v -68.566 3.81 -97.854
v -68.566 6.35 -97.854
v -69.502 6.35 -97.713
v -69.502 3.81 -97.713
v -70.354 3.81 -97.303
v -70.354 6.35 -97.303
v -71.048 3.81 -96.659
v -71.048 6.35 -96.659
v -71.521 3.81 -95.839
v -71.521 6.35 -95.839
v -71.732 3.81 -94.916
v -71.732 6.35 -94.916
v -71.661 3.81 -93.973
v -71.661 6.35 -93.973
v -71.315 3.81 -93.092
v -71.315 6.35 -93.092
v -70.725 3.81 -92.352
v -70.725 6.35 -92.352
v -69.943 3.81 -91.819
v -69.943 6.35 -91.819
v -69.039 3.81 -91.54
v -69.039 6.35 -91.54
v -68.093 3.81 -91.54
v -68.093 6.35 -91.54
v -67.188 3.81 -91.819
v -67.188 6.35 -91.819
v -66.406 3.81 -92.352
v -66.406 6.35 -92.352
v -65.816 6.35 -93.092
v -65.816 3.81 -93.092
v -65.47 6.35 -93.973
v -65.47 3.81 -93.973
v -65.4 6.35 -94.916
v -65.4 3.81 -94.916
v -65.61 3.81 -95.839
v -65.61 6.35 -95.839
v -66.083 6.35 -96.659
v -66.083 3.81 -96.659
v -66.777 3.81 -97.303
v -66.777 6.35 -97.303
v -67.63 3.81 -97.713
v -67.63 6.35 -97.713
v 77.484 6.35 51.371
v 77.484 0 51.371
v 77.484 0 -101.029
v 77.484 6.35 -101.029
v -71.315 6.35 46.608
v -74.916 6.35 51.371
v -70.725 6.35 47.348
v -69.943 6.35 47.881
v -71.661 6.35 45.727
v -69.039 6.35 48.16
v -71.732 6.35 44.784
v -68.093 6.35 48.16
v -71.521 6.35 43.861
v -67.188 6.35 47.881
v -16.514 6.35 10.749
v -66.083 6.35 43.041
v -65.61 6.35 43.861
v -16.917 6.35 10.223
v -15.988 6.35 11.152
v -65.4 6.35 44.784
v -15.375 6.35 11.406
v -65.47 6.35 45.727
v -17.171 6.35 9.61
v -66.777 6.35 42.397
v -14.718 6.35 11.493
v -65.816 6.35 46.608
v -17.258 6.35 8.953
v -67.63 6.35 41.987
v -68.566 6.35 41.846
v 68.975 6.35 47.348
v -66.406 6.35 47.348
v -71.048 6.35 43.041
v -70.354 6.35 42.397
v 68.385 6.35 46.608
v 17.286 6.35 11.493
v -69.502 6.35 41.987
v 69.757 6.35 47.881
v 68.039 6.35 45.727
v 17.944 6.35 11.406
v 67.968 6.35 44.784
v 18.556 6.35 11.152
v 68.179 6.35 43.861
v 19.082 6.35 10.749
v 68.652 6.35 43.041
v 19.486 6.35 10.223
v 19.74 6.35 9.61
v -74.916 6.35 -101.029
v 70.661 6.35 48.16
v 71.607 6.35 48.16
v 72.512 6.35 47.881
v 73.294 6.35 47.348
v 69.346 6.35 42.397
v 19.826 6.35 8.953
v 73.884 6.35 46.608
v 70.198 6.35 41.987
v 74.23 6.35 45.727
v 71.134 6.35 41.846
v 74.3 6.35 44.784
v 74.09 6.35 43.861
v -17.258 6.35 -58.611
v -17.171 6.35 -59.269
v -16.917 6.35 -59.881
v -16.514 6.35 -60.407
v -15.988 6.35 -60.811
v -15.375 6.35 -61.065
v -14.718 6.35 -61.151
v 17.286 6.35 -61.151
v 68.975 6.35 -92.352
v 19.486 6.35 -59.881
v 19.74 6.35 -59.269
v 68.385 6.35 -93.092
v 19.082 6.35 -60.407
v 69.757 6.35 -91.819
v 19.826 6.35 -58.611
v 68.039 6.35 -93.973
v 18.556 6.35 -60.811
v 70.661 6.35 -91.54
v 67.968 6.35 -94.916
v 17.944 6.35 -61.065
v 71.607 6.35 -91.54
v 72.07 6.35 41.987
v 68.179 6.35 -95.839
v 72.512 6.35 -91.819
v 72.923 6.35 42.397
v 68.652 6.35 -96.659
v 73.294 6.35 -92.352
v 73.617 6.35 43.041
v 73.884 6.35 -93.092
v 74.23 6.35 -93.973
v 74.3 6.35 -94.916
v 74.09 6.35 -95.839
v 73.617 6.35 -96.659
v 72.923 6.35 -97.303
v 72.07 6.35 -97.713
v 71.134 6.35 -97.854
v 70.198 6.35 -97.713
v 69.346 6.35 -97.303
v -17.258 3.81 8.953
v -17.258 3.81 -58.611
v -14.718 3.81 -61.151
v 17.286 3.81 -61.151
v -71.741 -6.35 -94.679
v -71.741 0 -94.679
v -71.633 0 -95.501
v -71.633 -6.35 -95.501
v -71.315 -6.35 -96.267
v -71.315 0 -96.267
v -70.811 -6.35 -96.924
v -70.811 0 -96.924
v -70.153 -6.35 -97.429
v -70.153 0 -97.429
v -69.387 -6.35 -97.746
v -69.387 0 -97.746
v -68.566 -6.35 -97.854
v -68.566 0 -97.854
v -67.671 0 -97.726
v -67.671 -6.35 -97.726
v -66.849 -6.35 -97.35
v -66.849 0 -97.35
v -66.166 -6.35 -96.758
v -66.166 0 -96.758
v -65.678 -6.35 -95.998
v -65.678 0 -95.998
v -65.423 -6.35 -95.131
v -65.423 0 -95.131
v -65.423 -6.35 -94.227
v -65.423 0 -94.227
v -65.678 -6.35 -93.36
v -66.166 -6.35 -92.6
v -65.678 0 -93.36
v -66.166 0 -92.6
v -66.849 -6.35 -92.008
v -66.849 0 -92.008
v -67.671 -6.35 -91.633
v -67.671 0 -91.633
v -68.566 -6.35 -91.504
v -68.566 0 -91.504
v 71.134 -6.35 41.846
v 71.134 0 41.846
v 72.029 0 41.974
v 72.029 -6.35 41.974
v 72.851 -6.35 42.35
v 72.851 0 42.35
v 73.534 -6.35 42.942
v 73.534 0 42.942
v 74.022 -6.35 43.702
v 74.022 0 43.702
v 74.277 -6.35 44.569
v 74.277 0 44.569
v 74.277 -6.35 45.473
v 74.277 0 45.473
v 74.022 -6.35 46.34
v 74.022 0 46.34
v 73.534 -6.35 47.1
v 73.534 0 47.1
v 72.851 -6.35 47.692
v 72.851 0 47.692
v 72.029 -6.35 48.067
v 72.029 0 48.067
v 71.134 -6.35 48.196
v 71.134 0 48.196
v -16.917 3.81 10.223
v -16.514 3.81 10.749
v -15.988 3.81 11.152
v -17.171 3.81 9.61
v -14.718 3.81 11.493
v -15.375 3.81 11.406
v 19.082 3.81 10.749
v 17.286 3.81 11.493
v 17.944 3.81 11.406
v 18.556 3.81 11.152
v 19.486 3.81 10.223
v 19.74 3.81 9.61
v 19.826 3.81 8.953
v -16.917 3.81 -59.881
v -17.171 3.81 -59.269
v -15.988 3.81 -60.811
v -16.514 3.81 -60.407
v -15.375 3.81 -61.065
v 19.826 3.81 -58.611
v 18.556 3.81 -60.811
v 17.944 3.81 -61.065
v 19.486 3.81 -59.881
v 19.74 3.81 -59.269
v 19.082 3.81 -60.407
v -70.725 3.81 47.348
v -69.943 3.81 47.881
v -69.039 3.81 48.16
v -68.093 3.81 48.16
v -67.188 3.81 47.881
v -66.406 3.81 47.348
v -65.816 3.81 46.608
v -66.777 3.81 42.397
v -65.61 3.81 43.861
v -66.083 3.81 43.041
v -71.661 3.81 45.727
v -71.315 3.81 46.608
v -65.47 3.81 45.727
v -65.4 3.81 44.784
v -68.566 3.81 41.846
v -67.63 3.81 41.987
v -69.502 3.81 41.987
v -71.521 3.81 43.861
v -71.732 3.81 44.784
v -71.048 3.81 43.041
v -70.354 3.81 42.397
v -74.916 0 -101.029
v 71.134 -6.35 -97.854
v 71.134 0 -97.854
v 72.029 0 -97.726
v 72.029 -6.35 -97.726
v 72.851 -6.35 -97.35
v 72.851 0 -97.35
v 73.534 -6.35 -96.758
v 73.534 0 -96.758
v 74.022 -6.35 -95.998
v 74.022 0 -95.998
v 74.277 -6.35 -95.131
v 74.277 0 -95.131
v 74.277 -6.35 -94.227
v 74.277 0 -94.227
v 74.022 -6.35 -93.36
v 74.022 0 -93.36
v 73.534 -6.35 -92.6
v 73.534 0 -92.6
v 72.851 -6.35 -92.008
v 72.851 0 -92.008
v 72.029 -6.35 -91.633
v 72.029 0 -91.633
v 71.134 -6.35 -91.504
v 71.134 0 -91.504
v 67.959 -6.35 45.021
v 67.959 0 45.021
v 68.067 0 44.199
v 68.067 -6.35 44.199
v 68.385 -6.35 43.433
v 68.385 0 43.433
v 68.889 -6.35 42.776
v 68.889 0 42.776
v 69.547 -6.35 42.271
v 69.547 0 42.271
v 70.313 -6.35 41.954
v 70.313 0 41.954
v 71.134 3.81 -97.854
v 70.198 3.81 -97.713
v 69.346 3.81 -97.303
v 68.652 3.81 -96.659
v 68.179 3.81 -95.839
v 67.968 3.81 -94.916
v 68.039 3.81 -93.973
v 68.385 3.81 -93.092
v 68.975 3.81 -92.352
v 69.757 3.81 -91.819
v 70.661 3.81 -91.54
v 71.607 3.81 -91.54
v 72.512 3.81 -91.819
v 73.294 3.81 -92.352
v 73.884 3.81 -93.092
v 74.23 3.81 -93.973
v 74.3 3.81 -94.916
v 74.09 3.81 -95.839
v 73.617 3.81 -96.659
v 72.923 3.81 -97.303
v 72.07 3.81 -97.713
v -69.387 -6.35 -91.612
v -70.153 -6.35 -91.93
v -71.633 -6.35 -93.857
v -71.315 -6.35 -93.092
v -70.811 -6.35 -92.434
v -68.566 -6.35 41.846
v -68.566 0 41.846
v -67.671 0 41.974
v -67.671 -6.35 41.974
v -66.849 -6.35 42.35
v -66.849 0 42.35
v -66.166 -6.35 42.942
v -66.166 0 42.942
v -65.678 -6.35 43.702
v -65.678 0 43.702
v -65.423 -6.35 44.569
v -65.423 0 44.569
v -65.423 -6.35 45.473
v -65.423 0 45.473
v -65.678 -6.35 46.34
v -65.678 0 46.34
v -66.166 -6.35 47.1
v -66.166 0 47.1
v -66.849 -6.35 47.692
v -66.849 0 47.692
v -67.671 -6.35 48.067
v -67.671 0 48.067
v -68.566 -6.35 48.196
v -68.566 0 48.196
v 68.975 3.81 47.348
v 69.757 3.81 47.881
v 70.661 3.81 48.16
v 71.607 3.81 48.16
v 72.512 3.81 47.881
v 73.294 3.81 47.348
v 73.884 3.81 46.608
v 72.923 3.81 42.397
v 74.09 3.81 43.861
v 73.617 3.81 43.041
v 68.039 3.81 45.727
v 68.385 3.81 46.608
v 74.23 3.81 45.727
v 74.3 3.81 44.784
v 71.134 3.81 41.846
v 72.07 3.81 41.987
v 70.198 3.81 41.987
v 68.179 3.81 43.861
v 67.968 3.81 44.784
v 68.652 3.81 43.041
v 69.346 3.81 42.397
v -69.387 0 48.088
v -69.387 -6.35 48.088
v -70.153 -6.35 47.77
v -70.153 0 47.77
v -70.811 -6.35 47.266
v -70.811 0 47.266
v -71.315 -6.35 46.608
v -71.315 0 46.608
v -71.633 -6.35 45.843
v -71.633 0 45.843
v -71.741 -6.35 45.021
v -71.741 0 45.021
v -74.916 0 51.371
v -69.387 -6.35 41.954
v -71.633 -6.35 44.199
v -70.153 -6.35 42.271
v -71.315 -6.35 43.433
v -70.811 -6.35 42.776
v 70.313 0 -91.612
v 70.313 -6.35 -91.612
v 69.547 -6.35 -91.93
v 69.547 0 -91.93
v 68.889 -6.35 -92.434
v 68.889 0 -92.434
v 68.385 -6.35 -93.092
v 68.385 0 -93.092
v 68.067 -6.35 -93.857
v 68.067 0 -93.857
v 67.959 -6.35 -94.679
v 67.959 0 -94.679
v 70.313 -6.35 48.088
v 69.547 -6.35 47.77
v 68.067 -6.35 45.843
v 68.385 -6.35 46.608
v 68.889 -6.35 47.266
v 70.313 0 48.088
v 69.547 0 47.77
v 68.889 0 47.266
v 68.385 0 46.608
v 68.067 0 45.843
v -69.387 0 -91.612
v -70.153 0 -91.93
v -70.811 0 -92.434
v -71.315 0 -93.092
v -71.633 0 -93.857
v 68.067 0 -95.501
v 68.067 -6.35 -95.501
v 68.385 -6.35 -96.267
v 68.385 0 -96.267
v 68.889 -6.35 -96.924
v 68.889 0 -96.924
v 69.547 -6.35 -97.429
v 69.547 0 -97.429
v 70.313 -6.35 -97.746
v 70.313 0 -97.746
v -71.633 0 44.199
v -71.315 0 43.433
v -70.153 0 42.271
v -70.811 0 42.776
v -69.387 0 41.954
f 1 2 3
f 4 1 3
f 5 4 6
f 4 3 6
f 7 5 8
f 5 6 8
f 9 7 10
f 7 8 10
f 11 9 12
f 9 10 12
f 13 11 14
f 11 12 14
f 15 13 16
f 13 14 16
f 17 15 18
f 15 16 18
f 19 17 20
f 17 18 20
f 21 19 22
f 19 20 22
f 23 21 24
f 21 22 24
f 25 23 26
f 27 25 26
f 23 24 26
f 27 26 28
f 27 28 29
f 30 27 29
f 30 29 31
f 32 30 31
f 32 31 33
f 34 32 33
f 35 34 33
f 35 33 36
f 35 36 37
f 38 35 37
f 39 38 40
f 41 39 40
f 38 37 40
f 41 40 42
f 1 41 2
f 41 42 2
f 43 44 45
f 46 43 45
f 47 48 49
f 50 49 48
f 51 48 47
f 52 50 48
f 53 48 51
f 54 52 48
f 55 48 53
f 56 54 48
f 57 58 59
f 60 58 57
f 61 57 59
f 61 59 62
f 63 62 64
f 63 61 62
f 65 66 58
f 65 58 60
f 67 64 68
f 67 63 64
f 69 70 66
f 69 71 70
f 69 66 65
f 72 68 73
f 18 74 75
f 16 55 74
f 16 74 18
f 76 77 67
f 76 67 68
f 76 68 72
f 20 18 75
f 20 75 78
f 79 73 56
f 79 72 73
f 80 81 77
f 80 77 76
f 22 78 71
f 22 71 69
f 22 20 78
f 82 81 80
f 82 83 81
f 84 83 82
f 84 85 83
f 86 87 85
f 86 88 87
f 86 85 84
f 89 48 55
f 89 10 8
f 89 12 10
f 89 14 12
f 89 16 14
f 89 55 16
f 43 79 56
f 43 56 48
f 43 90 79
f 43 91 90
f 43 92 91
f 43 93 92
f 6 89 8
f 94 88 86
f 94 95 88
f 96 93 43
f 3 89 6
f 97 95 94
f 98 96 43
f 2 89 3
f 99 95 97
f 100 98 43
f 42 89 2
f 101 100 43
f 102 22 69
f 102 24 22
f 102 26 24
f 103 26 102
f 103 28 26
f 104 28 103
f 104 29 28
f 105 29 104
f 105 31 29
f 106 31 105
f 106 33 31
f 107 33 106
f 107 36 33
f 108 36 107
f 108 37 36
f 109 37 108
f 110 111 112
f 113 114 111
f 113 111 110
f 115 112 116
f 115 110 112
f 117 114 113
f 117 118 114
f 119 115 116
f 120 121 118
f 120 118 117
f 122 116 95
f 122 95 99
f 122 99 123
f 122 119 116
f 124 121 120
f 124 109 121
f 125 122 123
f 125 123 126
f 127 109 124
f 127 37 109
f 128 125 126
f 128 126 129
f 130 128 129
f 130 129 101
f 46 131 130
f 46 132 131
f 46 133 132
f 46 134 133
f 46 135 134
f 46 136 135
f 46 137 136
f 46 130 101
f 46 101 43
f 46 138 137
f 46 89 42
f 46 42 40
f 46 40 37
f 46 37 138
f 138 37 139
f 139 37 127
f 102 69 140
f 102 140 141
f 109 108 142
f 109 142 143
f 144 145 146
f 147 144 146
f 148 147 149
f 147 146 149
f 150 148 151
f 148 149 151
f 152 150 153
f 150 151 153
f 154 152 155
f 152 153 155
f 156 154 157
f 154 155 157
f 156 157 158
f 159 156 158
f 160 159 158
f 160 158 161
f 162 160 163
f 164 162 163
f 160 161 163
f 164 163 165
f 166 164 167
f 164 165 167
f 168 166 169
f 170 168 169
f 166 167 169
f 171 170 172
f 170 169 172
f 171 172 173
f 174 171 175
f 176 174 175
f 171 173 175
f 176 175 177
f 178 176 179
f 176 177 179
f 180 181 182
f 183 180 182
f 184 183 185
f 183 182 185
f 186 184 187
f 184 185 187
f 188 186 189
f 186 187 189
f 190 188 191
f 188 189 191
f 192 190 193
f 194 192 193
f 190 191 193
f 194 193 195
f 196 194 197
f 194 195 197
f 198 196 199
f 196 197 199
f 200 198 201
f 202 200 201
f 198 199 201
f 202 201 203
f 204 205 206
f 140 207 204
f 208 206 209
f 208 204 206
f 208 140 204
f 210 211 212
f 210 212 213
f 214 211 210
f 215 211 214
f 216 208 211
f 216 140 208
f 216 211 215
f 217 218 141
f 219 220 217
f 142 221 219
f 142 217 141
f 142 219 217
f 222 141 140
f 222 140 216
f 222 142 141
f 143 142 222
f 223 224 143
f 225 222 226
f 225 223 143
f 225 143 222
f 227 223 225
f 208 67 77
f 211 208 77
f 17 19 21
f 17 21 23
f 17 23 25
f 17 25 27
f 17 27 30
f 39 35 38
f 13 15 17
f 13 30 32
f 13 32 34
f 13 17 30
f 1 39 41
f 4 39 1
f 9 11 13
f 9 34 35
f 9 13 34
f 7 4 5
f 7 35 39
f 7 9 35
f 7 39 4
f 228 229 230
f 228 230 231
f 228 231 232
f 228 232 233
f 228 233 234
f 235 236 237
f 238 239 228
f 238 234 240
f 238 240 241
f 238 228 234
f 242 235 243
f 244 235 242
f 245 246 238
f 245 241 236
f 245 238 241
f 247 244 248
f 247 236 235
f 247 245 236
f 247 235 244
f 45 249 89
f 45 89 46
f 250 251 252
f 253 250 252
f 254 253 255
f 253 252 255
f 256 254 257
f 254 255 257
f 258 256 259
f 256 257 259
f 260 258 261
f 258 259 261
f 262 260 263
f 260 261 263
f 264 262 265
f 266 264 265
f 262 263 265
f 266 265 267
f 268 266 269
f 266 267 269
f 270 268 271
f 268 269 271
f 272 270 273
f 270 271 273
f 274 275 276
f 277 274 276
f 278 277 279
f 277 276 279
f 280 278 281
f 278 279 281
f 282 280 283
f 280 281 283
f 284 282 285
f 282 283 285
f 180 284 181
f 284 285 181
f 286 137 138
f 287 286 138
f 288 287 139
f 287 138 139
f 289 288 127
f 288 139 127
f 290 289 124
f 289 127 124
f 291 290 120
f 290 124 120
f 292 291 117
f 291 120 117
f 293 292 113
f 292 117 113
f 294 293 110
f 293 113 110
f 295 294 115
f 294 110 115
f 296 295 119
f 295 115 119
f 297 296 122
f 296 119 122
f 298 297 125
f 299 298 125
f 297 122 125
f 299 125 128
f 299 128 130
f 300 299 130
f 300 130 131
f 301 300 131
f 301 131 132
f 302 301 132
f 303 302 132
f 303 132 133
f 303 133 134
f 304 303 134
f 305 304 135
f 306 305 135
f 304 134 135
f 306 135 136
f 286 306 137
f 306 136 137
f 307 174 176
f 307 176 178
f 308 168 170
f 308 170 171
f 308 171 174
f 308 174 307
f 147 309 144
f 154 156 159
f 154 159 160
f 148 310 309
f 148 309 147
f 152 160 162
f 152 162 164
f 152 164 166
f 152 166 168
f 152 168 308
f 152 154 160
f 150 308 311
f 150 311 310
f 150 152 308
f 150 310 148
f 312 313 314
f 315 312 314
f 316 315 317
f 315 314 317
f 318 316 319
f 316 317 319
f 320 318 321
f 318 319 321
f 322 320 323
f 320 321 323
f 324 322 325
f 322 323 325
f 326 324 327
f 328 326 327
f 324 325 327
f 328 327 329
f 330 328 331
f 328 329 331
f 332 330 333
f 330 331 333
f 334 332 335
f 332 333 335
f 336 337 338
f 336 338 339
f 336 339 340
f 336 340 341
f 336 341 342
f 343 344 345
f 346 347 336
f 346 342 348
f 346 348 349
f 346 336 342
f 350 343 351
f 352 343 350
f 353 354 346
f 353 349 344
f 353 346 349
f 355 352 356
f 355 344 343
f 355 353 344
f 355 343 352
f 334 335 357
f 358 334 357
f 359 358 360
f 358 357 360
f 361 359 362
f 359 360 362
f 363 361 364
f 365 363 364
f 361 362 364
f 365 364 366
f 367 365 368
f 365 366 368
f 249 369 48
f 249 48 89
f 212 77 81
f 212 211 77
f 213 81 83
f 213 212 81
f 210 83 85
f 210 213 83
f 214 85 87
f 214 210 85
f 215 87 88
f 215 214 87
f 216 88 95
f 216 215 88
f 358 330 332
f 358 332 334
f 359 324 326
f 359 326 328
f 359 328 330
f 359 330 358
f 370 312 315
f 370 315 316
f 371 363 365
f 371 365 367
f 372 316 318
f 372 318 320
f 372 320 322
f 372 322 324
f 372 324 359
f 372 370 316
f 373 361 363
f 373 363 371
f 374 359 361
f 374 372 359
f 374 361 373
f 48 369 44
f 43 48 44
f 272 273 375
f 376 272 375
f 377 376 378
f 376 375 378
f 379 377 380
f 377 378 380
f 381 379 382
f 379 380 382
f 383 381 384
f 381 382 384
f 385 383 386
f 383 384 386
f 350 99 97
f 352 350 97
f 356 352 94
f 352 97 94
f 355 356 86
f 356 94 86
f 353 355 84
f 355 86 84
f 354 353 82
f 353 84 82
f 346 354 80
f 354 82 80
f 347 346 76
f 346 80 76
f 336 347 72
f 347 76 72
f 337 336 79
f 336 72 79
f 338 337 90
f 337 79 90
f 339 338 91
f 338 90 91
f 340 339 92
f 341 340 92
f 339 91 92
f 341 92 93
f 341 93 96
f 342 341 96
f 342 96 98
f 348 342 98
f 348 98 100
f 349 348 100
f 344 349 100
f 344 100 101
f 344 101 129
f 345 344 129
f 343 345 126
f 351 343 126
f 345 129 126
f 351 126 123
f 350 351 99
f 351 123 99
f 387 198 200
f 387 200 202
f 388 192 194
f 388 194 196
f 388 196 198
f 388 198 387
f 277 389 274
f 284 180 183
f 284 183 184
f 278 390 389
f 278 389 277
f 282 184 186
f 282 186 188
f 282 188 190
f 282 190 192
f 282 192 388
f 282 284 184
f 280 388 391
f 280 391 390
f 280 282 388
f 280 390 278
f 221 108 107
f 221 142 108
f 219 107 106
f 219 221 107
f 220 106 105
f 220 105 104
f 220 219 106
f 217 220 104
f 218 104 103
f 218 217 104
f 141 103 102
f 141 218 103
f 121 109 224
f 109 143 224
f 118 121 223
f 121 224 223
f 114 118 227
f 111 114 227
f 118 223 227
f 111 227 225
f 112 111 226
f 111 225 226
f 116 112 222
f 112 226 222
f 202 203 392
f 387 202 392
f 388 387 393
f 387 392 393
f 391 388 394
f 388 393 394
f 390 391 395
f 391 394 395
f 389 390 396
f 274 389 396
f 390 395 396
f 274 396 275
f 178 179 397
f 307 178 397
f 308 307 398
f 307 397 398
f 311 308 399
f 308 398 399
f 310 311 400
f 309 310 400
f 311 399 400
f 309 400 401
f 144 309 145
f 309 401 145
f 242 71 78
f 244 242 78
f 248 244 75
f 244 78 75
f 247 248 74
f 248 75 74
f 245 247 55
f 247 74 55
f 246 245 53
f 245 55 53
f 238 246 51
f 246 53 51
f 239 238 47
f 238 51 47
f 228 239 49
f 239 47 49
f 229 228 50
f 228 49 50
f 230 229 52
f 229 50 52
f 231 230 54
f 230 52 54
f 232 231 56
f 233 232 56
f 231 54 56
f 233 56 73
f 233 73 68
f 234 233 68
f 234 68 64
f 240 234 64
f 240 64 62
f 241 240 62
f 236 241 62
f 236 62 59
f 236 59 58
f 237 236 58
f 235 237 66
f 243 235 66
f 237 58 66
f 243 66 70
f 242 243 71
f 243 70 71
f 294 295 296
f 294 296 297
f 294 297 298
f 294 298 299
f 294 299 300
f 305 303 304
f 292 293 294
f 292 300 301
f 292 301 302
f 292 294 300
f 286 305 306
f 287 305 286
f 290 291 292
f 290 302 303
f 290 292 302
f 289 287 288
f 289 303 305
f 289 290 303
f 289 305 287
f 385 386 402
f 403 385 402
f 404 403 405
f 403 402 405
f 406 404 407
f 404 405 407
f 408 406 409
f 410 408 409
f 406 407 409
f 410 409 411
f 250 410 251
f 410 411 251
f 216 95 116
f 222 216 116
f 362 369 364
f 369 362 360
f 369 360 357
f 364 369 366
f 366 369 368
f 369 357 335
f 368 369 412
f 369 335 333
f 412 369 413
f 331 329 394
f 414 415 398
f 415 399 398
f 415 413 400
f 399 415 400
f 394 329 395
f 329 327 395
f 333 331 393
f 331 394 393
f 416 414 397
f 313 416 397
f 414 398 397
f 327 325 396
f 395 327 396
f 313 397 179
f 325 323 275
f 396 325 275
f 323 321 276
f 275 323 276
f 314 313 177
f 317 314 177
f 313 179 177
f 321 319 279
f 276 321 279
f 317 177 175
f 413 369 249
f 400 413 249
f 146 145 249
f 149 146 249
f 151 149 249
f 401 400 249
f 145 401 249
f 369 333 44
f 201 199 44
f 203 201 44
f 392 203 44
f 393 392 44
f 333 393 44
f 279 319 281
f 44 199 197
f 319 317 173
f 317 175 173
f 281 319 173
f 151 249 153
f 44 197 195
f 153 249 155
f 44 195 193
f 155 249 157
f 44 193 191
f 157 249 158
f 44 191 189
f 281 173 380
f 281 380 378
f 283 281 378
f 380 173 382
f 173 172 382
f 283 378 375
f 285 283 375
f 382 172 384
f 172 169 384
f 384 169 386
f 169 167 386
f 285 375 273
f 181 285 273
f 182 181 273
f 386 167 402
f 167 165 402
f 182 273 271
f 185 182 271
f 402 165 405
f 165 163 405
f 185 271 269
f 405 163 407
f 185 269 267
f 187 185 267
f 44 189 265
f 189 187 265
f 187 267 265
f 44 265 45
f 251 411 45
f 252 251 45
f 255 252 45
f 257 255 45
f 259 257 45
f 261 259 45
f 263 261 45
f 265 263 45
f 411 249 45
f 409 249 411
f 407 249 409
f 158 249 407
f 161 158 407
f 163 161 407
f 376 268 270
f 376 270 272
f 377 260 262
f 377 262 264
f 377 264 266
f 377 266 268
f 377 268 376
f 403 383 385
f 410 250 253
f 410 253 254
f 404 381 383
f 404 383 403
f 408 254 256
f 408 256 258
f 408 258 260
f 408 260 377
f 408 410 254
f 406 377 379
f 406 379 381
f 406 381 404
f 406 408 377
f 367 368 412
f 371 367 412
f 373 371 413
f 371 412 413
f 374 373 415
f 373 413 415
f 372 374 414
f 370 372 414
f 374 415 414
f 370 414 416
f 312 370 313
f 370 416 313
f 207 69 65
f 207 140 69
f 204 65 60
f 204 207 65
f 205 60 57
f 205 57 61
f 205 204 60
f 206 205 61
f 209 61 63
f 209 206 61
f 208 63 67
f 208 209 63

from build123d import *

# Parameters (mm, degrees)
SKETCH1_W           = 152.4
SKETCH1_H           = 152.4
BOSS_EXTRUDE1_DEPTH = 6.35
BOSS_EXTRUDE2_DEPTH = 6.35
SKETCH3_R           = 3.175
CUT_EXTRUDE1_DEPTH  = 2.54
SKETCH4_W           = 37.084
SKETCH4_H           = 72.644
CUT_EXTRUDE2_DEPTH  = 2.54
FILLET1_R           = 2.54
FILLET2_R           = 2.54
FILLET3_R           = 2.54
FILLET4_R           = 2.54


with BuildPart() as part:
    # Sketch1 → Boss-Extrude1 (new body)
    with BuildSketch(Plane(origin=(0, 0, 0), x_dir=(1, 0, 0), z_dir=(0, 1, 0))):
        with Locations((1.284269663, 24.829213483)):
            Rectangle(SKETCH1_W, SKETCH1_H)
    extrude(amount=BOSS_EXTRUDE1_DEPTH)

    # Sketch2 → Boss-Extrude2 (add)
    with BuildSketch(Plane(origin=(0, 0, 0), x_dir=(-1, 0, 0), z_dir=(0, -1, 0))):
        with BuildLine():
            ThreePointArc((-71.134269663, 97.854213483), (-74.309269663, 94.679213483), (-71.134269663, 91.504213483))
            Line((-71.134269663, 91.504213483), (-71.134269663, 97.854213483))
        make_face()
        with BuildLine():
            Line((-71.134269663, 97.854213483), (-71.134269663, 91.504213483))
            ThreePointArc((-71.134269663, 91.504213483), (-68.889205633, 92.434149453), (-67.959269663, 94.679213483))
            ThreePointArc((-67.959269663, 94.679213483), (-68.889205633, 96.924277513), (-71.134269663, 97.854213483))
        make_face()
        with BuildLine():
            ThreePointArc((68.565730337, 97.854213483), (65.390730337, 94.679213483), (68.565730337, 91.504213483))
            Line((68.565730337, 91.504213483), (68.565730337, 97.854213483))
        make_face()
        with BuildLine():
            Line((68.565730337, 97.854213483), (68.565730337, 91.504213483))
            ThreePointArc((68.565730337, 91.504213483), (70.810794367, 92.434149453), (71.740730337, 94.679213483))
            ThreePointArc((71.740730337, 94.679213483), (70.810794367, 96.924277513), (68.565730337, 97.854213483))
        make_face()
        with BuildLine():
            ThreePointArc((68.565730337, -41.845786517), (65.390730337, -45.020786517), (68.565730337, -48.195786517))
            Line((68.565730337, -48.195786517), (68.565730337, -41.845786517))
        make_face()
        with BuildLine():
            Line((68.565730337, -41.845786517), (68.565730337, -48.195786517))
            ThreePointArc((68.565730337, -48.195786517), (70.810794367, -47.265850547), (71.740730337, -45.020786517))
            ThreePointArc((71.740730337, -45.020786517), (70.810794367, -42.775722487), (68.565730337, -41.845786517))
        make_face()
        with BuildLine():
            ThreePointArc((-71.134269663, -41.845786517), (-74.309269663, -45.020786517), (-71.134269663, -48.195786517))
            Line((-71.134269663, -48.195786517), (-71.134269663, -41.845786517))
        make_face()
        with BuildLine():
            Line((-71.134269663, -41.845786517), (-71.134269663, -48.195786517))
            ThreePointArc((-71.134269663, -48.195786517), (-68.889205633, -47.265850547), (-67.959269663, -45.020786517))
            ThreePointArc((-67.959269663, -45.020786517), (-68.889205633, -42.775722487), (-71.134269663, -41.845786517))
        make_face()
    extrude(amount=BOSS_EXTRUDE2_DEPTH)

    # Sketch3 → Cut-Extrude1 (cut)
    with BuildSketch(Plane(origin=(0, 6.35, 0), x_dir=(1, 0, 0), z_dir=(0, 1, 0))):
        with Locations(Location((-68.565730337, 94.679213483, 0), (0, 0, 90))):
            Circle(SKETCH3_R)
        with Locations(Location((71.134269663, 94.679213483, 0), (0, 0, 90))):
            Circle(SKETCH3_R)
        with Locations(Location((-68.565730337, -45.020786517, 0), (0, 0, 90))):
            Circle(SKETCH3_R)
        with Locations(Location((71.134269663, -45.020786517, 0), (0, 0, 90))):
            Circle(SKETCH3_R)
    extrude(amount=-CUT_EXTRUDE1_DEPTH, mode=Mode.SUBTRACT)

    # Sketch4 → Cut-Extrude2 (cut)
    with BuildSketch(Plane(origin=(0, 6.35, 0), x_dir=(1, 0, 0), z_dir=(0, 1, 0))):
        with Locations((1.284269663, 24.829213483)):
            Rectangle(SKETCH4_W, SKETCH4_H)
    extrude(amount=-CUT_EXTRUDE2_DEPTH, mode=Mode.SUBTRACT)

    # Fillet1
    fillet1_edges = [part.edges().sort_by_distance(p)[0] for p in [
        (-17.257730337, 5.08, -61.151213483),
    ]]
    fillet(fillet1_edges, radius=FILLET1_R)

    # Fillet2
    fillet2_edges = [part.edges().sort_by_distance(p)[0] for p in [
        (19.826269663, 5.08, -61.151213483),
    ]]
    fillet(fillet2_edges, radius=FILLET2_R)

    # Fillet3
    fillet3_edges = [part.edges().sort_by_distance(p)[0] for p in [
        (-17.257730337, 5.08, 11.492786517),
    ]]
    fillet(fillet3_edges, radius=FILLET3_R)

    # Fillet4
    fillet4_edges = [part.edges().sort_by_distance(p)[0] for p in [
        (19.826269663, 5.08, 11.492786517),
    ]]
    fillet(fillet4_edges, radius=FILLET4_R)


solid = part.part
